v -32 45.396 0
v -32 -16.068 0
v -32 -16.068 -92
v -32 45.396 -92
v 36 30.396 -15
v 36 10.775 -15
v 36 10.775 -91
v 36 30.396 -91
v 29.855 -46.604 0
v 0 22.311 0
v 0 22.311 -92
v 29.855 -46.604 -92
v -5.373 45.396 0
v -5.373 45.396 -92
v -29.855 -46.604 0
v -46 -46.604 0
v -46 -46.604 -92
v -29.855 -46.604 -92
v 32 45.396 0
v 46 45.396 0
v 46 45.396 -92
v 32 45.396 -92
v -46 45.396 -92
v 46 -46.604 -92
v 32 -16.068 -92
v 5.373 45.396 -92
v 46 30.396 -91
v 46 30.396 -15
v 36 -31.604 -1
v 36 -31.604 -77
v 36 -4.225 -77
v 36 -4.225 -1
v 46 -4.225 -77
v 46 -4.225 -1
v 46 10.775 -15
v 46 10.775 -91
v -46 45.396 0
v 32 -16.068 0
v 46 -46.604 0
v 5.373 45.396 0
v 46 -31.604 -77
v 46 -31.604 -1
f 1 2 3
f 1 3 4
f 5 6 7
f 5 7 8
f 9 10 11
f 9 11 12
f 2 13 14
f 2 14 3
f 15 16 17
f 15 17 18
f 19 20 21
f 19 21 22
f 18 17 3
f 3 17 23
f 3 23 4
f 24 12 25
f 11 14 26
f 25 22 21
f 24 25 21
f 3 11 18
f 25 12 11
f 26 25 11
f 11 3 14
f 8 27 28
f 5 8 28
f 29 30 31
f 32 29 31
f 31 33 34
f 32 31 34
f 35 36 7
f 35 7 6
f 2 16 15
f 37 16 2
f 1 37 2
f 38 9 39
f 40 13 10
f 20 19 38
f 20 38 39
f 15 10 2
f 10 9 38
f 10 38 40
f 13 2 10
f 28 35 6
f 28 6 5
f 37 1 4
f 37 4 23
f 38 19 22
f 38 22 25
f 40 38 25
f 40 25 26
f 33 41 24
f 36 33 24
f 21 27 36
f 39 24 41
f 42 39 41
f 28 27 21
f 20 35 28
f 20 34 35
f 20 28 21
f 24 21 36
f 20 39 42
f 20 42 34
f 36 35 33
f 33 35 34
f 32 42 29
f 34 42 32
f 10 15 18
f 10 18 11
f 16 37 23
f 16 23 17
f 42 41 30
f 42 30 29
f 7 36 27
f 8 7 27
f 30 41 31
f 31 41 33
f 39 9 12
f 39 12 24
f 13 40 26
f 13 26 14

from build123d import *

# Parameters (mm, degrees)
F1_DEPTH = 92
F2_W     = 19.621109
F2_H     = 76
F2_W_2   = 27.378891
F3_DEPTH = 10


with BuildPart() as f1:
    # F0 (on Top) → F1 (new body)
    with BuildSketch(Plane.XY):
        Polygon((-46, 45.39616), (-46, -46.60384), (-29.854571, -46.60384), (0, 22.311091), (29.854571, -46.60384), (46, -46.60384), (46, 45.39616), (32, 45.39616), (32, -16.067849), (5.373236, 45.39616), (0, 45.39616), (-5.373236, 45.39616), (-32, -16.067849), (-32, 45.39616), align=None)
    extrude(amount=-F1_DEPTH)

    # F2 (on face) → F3 (cut)
    with BuildSketch(Plane.YZ.offset(46)):
        with Locations((20.585605, -53)):
            Rectangle(F2_W, F2_H)
        with Locations((-17.914395, -39)):
            Rectangle(F2_W_2, F2_H)
    extrude(amount=-F3_DEPTH, mode=Mode.SUBTRACT)


solid = f1.part
